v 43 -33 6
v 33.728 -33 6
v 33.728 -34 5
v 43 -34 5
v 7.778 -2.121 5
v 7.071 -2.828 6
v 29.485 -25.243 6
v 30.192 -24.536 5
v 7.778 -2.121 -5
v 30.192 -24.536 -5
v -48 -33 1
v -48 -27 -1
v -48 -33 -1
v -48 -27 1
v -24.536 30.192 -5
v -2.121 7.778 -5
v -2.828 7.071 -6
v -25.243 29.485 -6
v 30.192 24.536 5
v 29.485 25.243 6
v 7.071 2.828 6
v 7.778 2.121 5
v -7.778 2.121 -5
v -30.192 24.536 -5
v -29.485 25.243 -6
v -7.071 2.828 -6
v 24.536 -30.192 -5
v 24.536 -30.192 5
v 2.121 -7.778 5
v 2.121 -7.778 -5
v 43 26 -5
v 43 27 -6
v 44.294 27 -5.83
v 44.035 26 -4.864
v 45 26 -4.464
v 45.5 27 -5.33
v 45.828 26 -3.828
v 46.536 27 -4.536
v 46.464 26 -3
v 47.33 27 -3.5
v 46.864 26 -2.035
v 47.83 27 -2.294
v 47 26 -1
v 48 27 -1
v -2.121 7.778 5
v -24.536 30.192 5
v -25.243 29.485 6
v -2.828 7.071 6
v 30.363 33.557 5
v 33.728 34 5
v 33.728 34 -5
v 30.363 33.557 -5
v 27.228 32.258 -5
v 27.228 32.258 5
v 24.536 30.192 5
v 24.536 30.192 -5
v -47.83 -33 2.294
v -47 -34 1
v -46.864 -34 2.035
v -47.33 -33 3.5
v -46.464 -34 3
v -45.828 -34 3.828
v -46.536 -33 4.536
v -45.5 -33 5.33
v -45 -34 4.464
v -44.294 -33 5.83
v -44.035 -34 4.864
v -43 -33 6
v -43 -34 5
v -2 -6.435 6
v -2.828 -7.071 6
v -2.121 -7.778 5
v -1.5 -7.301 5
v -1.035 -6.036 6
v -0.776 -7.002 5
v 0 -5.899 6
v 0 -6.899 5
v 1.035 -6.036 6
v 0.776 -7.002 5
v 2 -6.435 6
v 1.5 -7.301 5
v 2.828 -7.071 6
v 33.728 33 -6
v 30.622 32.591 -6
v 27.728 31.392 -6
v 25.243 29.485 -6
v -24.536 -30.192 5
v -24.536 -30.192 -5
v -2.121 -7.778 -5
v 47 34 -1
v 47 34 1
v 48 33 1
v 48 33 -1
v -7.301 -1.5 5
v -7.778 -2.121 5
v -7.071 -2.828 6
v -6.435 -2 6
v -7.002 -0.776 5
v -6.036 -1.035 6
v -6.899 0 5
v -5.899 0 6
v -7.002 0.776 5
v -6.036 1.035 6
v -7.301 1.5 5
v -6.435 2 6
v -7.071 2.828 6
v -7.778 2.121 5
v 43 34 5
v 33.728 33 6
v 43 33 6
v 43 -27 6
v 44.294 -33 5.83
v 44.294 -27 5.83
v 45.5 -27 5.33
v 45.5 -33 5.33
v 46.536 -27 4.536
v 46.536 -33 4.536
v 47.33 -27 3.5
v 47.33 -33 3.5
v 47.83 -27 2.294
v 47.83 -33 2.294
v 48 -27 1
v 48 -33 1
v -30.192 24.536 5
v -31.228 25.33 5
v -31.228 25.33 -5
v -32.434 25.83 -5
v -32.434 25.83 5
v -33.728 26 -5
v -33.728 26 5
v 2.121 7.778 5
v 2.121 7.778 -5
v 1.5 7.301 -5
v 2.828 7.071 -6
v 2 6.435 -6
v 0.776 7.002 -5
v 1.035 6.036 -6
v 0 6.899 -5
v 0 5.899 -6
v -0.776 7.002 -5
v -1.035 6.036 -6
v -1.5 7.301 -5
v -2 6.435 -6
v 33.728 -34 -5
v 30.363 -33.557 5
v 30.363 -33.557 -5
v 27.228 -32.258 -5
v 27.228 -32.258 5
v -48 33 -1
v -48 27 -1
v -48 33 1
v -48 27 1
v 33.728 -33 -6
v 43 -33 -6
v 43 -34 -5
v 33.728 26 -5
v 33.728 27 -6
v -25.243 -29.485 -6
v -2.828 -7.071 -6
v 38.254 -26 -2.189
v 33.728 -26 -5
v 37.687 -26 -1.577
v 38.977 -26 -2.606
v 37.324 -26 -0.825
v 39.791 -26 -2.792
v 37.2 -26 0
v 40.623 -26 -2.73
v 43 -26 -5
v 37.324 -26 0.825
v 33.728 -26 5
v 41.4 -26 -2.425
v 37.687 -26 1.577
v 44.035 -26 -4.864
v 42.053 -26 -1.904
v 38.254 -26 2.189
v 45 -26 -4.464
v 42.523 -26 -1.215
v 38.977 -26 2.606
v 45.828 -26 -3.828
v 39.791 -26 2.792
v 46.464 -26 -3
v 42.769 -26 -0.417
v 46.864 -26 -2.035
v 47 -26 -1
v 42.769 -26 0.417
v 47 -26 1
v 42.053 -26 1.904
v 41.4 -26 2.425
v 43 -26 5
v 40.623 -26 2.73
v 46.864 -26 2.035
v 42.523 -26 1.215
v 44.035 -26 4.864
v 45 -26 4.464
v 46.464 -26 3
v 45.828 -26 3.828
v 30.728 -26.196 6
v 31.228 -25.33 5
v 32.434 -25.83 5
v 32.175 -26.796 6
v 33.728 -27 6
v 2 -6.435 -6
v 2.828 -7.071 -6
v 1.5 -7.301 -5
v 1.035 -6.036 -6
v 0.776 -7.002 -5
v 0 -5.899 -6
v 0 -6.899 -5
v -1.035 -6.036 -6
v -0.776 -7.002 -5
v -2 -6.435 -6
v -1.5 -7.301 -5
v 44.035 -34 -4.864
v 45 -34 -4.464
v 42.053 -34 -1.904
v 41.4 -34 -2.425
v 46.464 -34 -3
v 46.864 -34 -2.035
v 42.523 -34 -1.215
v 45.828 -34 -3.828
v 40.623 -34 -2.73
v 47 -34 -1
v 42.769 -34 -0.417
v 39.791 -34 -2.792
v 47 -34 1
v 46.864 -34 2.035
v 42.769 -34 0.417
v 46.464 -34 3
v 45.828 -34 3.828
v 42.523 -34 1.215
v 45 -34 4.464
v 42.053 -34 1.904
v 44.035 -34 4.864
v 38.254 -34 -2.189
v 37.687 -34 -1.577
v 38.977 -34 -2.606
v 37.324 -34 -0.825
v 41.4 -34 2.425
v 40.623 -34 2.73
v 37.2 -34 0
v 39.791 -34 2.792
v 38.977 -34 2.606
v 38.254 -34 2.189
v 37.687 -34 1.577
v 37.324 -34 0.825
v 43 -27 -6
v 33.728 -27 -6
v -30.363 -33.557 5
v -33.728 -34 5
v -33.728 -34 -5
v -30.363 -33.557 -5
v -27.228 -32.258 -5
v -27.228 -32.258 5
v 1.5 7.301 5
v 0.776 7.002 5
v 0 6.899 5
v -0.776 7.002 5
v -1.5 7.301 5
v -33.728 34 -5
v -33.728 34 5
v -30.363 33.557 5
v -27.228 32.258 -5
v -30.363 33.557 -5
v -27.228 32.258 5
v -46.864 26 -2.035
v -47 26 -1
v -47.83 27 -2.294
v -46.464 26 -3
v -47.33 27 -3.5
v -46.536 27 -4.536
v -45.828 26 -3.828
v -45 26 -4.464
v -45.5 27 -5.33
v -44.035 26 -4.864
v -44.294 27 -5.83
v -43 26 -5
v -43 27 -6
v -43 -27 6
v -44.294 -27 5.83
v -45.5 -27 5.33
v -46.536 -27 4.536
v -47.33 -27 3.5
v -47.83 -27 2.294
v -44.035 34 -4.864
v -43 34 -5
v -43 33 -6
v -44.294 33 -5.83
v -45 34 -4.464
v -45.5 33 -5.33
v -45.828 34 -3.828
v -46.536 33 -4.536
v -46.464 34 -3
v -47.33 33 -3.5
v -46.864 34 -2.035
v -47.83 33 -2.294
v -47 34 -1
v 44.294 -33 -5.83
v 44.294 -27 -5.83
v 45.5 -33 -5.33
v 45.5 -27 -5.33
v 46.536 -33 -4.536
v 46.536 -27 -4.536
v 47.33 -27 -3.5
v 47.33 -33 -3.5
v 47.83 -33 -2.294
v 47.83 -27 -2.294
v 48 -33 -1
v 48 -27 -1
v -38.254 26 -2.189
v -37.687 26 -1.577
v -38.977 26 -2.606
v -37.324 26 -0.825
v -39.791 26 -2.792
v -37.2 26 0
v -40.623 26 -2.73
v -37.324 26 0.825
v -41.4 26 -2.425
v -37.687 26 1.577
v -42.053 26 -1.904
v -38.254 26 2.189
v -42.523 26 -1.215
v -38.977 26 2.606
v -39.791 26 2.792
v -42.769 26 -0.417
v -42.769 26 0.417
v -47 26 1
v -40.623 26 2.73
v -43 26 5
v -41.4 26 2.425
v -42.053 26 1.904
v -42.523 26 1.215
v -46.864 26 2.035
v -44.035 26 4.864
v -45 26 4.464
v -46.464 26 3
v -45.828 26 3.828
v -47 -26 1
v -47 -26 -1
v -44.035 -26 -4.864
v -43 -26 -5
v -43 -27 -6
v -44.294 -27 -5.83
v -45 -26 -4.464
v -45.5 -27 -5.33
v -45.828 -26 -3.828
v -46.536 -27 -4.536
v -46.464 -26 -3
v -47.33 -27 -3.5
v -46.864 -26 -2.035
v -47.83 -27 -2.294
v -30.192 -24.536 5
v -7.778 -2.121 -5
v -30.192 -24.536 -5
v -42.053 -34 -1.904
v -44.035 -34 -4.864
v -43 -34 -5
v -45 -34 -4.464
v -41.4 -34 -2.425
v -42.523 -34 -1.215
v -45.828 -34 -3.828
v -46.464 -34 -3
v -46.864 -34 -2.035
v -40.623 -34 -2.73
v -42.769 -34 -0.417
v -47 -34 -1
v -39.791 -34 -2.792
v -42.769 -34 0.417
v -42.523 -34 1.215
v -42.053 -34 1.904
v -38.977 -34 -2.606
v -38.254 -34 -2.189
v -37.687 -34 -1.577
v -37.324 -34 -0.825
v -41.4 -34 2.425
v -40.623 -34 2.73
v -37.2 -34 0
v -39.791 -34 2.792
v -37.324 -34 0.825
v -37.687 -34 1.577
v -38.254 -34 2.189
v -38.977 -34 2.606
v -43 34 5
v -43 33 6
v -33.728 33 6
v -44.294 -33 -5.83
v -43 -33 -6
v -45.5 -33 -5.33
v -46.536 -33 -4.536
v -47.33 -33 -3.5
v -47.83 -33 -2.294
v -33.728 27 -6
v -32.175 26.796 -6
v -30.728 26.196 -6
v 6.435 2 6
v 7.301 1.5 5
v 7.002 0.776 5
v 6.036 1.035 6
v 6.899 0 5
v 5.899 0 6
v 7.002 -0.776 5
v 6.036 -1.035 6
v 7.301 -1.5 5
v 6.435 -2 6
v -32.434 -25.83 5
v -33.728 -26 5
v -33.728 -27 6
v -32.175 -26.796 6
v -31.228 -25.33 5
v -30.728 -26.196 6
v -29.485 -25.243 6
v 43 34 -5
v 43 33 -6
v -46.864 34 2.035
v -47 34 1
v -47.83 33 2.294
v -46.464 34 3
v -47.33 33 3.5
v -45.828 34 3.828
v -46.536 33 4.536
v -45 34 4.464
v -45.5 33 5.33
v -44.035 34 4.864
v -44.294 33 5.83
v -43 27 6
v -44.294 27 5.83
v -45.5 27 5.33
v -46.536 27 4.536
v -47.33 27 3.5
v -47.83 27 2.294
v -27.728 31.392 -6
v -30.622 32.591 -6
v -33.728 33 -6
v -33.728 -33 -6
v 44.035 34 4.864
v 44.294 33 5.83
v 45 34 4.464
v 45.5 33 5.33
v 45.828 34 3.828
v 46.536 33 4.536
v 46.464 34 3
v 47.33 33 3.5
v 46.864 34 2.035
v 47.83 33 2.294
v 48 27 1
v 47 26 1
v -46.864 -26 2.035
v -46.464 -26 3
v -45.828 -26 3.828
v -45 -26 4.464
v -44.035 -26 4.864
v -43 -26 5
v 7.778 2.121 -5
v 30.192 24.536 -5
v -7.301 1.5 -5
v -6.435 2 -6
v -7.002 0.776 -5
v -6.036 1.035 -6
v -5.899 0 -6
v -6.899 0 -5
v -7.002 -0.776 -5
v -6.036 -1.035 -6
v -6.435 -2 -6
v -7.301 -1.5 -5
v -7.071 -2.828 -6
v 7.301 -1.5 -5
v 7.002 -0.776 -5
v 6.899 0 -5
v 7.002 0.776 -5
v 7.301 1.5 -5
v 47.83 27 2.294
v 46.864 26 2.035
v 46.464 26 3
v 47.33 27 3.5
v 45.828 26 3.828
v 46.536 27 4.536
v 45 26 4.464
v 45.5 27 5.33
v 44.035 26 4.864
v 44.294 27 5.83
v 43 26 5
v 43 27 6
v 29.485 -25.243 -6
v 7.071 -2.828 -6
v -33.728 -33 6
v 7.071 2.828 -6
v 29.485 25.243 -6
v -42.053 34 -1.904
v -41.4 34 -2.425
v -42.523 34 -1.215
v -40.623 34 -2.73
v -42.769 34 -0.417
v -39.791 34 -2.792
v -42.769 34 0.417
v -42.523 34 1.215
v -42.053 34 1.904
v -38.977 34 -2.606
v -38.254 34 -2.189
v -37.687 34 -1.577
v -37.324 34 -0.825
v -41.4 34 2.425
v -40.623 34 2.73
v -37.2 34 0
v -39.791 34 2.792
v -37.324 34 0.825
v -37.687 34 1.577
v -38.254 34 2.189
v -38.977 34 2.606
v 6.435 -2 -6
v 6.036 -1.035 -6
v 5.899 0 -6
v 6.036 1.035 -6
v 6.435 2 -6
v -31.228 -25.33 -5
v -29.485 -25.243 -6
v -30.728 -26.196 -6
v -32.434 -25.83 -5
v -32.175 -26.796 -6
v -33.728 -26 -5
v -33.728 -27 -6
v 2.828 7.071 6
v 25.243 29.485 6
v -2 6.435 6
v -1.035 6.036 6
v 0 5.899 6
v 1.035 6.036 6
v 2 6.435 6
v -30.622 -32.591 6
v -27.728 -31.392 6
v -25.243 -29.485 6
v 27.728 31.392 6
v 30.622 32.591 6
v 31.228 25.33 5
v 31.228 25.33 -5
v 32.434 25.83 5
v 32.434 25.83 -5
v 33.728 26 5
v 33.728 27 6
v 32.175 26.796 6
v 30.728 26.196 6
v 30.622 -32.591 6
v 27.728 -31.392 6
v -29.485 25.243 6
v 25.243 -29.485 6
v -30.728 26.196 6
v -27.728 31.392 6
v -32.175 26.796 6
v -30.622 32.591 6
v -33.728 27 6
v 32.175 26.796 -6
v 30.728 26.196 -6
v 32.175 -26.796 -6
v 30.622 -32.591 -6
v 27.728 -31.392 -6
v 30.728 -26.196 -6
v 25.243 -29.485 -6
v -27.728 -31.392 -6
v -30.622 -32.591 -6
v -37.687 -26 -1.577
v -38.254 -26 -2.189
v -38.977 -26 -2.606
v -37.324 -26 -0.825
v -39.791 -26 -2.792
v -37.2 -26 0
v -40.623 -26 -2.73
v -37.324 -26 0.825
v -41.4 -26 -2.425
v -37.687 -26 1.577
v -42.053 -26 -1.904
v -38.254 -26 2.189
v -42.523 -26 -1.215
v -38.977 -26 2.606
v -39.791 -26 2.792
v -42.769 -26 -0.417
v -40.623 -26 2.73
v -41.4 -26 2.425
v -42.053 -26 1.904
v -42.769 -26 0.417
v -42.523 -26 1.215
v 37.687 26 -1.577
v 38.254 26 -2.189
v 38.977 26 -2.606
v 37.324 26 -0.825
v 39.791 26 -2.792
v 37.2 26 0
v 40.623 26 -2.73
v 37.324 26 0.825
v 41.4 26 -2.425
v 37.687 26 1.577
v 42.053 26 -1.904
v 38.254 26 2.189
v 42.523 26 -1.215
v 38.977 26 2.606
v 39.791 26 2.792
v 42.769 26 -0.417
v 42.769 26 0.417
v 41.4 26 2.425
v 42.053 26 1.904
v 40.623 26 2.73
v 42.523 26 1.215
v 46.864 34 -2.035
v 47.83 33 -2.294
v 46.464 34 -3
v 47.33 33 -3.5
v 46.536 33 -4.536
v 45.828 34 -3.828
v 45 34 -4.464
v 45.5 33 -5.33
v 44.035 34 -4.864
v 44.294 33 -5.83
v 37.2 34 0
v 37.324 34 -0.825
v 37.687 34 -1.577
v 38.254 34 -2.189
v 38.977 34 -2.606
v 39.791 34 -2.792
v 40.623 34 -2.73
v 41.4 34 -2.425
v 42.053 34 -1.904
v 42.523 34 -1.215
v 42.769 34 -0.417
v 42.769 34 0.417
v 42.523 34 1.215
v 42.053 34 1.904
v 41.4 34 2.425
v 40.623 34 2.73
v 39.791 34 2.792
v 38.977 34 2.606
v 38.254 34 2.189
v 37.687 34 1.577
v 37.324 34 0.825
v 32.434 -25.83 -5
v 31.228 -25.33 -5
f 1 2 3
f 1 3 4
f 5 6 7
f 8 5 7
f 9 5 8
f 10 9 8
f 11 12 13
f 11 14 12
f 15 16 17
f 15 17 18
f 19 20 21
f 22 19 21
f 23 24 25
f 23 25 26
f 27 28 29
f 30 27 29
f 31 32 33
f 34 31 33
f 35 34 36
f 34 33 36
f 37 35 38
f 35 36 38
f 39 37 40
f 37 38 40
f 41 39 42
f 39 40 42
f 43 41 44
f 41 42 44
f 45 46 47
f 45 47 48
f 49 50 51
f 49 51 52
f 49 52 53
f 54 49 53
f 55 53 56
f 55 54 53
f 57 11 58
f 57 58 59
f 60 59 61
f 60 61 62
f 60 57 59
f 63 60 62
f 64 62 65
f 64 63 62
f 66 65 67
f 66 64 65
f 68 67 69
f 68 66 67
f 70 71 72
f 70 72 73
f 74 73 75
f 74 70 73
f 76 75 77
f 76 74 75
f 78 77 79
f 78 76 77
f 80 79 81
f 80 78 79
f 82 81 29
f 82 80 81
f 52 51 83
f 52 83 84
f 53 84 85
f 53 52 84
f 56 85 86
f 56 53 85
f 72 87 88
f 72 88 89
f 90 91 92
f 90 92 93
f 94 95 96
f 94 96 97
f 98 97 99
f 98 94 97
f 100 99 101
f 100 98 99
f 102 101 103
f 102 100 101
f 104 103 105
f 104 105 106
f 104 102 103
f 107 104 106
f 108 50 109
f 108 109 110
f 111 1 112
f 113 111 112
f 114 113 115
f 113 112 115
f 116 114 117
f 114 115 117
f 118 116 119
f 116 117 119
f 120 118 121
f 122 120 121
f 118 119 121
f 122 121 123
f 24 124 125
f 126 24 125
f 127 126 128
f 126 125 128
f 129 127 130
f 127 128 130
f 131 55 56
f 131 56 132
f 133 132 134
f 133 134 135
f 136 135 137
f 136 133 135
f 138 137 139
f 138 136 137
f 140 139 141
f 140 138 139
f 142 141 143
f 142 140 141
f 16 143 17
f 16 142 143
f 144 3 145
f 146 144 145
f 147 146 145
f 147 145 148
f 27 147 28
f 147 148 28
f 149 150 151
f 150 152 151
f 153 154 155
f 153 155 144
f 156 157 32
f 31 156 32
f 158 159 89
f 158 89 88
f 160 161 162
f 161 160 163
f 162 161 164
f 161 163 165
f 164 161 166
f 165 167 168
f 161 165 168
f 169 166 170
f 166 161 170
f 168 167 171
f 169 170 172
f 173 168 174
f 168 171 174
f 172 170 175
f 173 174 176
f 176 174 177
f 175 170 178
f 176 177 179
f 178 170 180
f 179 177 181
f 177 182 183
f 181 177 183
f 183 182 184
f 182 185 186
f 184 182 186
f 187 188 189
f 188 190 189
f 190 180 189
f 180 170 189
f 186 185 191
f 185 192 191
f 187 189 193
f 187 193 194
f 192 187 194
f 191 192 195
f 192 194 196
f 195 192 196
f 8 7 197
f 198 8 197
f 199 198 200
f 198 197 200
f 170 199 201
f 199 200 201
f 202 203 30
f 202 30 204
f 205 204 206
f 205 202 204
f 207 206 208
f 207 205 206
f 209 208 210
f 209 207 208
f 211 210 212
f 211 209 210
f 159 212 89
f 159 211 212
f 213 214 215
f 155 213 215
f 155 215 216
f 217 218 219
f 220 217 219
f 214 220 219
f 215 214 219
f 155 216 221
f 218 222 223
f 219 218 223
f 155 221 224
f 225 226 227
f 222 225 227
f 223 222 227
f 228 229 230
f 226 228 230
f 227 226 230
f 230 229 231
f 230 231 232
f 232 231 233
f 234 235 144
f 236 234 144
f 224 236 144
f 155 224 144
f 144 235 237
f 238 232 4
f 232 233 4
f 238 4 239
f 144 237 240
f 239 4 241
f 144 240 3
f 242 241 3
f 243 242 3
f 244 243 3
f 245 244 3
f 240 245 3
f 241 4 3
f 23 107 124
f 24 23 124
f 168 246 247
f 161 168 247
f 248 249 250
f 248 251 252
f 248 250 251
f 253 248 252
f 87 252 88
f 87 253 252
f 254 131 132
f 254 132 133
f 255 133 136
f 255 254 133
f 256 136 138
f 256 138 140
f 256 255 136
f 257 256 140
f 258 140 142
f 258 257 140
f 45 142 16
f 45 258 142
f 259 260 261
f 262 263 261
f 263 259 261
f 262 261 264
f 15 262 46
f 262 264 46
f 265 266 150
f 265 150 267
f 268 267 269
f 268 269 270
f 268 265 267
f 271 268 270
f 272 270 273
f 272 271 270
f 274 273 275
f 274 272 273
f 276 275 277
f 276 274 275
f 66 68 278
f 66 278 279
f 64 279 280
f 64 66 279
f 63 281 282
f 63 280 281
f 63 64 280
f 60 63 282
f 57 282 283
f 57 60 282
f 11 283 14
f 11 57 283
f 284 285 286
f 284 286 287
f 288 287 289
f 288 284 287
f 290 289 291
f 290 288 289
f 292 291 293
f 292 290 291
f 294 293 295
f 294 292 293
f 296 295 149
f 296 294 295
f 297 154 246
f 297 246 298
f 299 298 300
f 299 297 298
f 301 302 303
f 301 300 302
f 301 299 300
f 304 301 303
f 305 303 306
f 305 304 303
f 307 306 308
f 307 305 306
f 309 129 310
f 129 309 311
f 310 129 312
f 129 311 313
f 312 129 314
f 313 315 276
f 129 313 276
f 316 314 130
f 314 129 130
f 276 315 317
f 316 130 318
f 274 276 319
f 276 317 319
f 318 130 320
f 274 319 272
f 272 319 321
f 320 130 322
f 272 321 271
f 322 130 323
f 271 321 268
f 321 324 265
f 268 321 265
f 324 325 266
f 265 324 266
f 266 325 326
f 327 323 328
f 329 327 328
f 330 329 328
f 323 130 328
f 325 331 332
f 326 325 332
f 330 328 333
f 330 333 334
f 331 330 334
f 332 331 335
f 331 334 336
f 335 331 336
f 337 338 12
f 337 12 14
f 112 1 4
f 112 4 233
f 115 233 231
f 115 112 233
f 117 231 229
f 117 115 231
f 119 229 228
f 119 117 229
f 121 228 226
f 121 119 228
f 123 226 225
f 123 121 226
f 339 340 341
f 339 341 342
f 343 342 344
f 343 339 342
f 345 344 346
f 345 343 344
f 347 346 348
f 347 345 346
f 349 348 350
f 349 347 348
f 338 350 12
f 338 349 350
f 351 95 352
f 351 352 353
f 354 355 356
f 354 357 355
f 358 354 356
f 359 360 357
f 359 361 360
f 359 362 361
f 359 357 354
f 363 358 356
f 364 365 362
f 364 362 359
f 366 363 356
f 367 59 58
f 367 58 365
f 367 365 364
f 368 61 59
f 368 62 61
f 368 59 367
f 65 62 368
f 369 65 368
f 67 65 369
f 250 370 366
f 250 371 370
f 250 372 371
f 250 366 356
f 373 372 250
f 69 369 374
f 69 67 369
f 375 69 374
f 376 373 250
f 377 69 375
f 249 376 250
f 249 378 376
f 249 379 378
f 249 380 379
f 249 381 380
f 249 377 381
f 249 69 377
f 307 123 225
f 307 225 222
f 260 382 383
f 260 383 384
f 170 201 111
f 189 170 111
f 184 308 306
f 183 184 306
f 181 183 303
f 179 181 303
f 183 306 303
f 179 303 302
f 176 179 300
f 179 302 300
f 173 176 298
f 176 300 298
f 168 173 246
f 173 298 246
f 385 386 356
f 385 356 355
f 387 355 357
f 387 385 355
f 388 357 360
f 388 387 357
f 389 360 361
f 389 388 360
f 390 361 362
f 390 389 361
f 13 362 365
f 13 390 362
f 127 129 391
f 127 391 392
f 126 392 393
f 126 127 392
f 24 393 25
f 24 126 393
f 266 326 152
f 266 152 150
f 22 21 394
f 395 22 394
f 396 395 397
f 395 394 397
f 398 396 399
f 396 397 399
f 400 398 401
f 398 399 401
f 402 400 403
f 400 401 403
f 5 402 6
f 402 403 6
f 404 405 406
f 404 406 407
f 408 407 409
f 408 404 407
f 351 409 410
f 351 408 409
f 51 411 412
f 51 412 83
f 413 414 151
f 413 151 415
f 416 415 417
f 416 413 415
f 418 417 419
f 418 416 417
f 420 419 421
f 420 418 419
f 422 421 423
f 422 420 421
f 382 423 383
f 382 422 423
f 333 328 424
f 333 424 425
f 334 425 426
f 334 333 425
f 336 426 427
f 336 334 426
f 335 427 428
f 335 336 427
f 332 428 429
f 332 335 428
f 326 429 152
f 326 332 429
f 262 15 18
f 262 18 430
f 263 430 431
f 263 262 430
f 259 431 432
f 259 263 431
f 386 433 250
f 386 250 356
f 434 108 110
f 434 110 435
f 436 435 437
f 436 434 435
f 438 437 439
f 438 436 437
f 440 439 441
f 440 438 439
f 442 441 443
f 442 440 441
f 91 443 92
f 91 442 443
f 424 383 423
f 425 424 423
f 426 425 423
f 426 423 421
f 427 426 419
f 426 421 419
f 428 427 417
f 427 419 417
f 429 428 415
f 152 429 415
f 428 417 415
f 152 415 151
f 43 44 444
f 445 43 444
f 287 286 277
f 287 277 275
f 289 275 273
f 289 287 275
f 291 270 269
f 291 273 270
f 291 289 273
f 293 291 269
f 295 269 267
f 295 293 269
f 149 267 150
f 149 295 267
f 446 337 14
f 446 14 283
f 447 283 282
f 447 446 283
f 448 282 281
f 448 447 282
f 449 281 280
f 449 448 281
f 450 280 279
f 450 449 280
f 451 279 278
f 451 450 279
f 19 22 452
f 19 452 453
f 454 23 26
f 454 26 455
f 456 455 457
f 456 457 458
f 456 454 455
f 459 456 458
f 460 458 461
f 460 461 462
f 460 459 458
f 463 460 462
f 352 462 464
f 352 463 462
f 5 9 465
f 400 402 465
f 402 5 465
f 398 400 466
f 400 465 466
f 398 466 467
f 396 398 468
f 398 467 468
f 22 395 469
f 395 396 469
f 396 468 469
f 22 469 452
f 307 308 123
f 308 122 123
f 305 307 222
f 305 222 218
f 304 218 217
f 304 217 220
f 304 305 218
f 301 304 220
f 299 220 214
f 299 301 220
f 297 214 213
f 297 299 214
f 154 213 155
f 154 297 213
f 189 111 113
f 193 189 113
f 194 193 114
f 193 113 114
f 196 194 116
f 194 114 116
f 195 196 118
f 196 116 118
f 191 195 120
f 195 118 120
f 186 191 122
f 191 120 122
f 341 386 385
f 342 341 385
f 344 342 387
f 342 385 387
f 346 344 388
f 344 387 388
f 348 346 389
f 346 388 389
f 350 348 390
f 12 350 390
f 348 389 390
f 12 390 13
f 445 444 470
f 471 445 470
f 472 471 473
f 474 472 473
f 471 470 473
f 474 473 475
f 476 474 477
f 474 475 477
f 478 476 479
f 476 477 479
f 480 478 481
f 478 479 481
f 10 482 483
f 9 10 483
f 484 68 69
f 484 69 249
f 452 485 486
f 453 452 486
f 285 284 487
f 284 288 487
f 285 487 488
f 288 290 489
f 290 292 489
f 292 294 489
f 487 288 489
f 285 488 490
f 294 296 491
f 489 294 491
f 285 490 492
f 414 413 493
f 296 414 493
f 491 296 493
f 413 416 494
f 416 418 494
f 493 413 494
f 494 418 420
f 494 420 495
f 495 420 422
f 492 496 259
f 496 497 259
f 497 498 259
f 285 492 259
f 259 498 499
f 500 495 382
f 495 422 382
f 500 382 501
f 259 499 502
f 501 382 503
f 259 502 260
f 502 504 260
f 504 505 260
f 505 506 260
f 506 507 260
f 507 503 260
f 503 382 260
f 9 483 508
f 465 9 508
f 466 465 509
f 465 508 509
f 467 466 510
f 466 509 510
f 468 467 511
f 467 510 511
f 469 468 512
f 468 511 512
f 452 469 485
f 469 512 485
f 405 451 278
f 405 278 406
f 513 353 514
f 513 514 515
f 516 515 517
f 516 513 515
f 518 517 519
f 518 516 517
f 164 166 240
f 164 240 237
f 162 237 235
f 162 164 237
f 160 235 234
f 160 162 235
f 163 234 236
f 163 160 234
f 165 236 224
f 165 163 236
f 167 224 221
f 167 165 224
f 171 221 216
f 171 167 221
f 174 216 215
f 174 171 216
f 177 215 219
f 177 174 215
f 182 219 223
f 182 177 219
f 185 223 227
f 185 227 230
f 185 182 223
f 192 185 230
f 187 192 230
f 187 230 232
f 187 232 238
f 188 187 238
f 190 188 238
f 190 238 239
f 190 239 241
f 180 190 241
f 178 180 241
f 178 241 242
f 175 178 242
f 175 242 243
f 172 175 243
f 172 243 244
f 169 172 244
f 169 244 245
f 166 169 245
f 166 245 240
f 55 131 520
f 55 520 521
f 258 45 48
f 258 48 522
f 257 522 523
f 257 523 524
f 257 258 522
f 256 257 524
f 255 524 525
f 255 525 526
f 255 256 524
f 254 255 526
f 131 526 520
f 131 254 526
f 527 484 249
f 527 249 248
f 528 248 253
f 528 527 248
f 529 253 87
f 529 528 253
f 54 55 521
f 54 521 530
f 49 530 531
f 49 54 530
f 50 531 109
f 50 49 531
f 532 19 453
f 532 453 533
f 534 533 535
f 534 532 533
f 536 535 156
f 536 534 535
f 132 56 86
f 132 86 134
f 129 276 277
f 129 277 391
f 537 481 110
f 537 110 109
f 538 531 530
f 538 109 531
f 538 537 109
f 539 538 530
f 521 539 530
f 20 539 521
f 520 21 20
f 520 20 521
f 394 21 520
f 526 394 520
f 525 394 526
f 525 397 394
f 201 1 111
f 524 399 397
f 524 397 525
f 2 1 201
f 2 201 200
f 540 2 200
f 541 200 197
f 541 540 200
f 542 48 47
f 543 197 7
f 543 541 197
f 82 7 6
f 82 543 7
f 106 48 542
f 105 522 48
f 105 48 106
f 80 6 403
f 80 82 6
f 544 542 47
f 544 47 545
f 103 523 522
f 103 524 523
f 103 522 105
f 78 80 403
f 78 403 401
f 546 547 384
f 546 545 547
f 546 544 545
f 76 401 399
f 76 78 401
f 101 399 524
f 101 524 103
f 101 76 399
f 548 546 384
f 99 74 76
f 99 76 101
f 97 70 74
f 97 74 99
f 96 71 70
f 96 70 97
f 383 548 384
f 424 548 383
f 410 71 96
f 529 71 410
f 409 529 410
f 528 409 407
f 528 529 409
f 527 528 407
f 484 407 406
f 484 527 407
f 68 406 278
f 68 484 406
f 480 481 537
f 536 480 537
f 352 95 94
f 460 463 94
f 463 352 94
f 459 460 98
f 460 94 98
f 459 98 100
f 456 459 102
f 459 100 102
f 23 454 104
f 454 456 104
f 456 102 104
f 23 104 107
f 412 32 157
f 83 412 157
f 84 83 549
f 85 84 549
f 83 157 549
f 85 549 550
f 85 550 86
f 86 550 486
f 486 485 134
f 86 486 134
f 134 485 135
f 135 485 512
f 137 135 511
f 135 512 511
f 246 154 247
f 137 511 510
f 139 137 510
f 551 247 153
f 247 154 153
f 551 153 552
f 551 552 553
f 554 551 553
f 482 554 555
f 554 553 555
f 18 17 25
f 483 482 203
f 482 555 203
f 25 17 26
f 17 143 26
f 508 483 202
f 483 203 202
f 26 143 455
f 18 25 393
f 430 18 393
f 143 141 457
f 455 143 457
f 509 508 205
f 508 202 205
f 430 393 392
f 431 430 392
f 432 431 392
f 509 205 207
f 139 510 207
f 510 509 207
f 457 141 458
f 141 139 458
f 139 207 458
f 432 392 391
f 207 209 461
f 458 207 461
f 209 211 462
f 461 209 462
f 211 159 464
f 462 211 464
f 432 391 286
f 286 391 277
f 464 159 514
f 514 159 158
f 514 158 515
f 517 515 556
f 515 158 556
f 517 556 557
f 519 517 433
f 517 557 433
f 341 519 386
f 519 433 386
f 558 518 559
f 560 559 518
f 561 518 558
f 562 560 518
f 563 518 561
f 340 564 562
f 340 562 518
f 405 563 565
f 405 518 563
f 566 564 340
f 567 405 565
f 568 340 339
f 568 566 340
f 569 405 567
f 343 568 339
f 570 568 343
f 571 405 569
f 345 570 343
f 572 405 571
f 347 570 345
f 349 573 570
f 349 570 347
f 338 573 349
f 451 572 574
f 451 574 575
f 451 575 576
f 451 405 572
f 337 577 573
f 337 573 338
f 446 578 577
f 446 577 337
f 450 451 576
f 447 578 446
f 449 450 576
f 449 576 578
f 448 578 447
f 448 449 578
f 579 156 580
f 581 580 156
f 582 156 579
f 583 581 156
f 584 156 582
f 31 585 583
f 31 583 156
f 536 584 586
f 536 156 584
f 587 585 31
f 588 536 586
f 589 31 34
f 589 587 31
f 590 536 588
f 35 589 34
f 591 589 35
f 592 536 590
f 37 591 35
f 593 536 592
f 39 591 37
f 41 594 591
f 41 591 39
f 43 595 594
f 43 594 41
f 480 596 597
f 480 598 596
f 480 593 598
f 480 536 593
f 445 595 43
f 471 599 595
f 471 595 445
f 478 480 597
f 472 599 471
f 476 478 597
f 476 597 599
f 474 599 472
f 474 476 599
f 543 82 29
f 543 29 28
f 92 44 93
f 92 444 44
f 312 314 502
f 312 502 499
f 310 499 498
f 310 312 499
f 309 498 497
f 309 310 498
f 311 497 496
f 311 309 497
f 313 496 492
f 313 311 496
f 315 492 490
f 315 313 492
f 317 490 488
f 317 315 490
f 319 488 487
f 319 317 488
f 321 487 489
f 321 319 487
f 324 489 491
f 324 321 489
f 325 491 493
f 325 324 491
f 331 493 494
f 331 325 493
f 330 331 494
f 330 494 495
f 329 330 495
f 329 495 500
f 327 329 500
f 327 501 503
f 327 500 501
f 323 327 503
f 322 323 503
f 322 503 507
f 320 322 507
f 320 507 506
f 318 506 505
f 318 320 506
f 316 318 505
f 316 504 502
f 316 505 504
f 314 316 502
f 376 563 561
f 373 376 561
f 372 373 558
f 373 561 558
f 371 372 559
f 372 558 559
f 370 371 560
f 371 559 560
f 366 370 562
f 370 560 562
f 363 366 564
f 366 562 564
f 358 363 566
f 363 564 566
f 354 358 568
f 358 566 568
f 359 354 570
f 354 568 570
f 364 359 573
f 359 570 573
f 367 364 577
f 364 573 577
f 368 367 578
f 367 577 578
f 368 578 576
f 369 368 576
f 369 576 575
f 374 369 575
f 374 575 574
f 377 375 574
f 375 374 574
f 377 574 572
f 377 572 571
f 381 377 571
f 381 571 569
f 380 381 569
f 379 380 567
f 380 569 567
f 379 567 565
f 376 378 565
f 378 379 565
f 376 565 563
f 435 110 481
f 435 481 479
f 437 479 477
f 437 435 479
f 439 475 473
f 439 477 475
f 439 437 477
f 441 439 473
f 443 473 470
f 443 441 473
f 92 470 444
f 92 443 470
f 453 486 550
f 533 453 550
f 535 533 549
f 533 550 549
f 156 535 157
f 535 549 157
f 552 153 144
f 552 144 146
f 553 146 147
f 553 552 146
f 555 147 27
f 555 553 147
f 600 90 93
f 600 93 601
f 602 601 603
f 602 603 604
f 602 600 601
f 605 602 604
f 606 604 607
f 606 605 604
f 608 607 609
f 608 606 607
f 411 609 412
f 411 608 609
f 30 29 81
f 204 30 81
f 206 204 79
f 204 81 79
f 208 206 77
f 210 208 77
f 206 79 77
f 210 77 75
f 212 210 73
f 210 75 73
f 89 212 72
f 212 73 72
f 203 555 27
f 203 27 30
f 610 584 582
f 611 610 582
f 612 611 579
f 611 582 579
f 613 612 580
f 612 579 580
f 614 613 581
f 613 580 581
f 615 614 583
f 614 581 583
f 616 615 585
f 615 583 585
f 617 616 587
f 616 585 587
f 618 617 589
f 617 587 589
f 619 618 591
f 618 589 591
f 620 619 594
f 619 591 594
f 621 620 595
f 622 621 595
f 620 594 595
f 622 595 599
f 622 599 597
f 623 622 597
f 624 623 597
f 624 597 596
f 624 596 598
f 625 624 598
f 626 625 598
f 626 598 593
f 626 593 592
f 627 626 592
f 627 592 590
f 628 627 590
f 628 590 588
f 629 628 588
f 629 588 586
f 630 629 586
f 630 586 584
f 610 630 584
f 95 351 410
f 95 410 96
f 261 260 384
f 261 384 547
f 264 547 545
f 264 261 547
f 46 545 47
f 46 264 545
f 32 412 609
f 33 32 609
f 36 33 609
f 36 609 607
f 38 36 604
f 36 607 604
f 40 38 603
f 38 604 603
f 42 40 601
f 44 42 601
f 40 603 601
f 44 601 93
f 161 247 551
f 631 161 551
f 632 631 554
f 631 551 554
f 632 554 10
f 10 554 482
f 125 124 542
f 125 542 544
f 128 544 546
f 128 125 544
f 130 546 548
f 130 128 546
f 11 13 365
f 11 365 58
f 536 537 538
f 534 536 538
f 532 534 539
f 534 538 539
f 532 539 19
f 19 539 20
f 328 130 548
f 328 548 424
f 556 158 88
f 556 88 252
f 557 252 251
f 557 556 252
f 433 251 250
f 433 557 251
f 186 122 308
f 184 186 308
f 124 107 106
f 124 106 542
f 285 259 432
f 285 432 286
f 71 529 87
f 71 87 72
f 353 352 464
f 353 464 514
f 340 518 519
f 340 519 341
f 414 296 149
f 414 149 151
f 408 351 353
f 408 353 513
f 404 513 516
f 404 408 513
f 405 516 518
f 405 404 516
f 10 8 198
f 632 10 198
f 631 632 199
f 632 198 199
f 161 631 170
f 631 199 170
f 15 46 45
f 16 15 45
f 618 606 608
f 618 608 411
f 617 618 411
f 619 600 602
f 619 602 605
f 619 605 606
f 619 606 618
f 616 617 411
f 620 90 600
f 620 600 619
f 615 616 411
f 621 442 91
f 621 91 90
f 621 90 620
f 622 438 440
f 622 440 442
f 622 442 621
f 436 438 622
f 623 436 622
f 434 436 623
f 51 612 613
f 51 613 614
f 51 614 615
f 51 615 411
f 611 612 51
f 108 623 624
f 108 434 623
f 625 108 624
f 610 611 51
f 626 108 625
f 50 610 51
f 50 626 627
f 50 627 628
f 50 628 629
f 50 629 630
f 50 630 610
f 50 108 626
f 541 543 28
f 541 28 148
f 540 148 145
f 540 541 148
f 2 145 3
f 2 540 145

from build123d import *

# Parameters (mm, degrees)
EXTRUIR_L_MINA1_DEPTH    = 6
TALADRO1_D               = 5.6
TALADRO1_DEPTH           = 68
REDONDEO1_R              = 5
REDONDEO1_OF_SIMETR_A1_R = 5
REDONDEO3_R              = 3
CHAFL_N4_SIZE            = 1


# Read off the part's stored shape, not the designer's step: Simetría2
with BuildPart() as part:
    # Croquis1 → Extruir-Lámina1 (new, symmetric)
    with BuildSketch(Plane.XY):
        with BuildLine():
            Line((2.828427125, -2.828427125), (30.192388155, 24.535533906))
            ThreePointArc((30.192388155, 24.535533906), (31.8145049, 25.619397663), (33.727922061, 26))
            Line((33.727922061, 26), (48, 26))
            Line((48, 26), (48, 34))
            Line((48, 34), (33.727922061, 34))
            ThreePointArc((33.727922061, 34), (28.753037441, 33.010433923), (24.535533906, 30.192388155))
            Line((24.535533906, 30.192388155), (-2.828427125, 2.828427125))
            Line((-2.828427125, 2.828427125), (2.828427125, -2.828427125))
        make_face()
    extruir_l_mina1 = extrude(amount=EXTRUIR_L_MINA1_DEPTH, both=True)

    # Taladro1
    with Locations(Plane(origin=(0, 34, 0), x_dir=(1, 0, 0), z_dir=(0, 1, 0))):
        with Locations((40, 0)):
            taladro1 = Hole(TALADRO1_D / 2, depth=TALADRO1_DEPTH)

    # Redondeo1
    redondeo1_edges = [part.edges().sort_by_distance(p)[0] for p in [
        (48, 30, 6),
        (48, 30, -6),
    ]]
    fillet(redondeo1_edges, radius=REDONDEO1_R)

    # Simetría1: Extruir-Lámina1, Taladro1 across plane
    add(extruir_l_mina1.mirror(Plane(origin=(0, 0, 0), x_dir=(0, 0, 1), z_dir=(1, 0, 0))))
    add(taladro1.mirror(Plane(origin=(0, 0, 0), x_dir=(0, 0, 1), z_dir=(1, 0, 0))), mode=Mode.SUBTRACT)

    # Redondeo1 of Simetría1
    redondeo1_of_simetr_a1_edges = [part.edges().sort_by_distance(p)[0] for p in [
        (-48, 30, 6),
        (-48, 30, -6),
    ]]
    fillet(redondeo1_of_simetr_a1_edges, radius=REDONDEO1_OF_SIMETR_A1_R)

    # Simetría2: part across plane


with BuildPart() as part_1:
    add(part.part)
    add(part.part.mirror(Plane.ZX))

    # Redondeo3
    redondeo3_edges = [part_1.edges().sort_by_distance(p)[0] for p in [
        (-5.656854249, 0, 0),
        (5.656854249, 0, 0),
        (0, -5.656854249, 0),
        (0, 5.656854249, 0),
    ]]
    fillet(redondeo3_edges, radius=REDONDEO3_R)

    # Chaflán4
    chafl_n4_edges = [part_1.edges().sort_by_distance(p)[0] for p in [
        (38.363961031, 34, -6),
        (-38.363961031, -26, -6),
        (-31.8145049, -25.619397663, -6),
        (-28.753037441, -33.010433923, 6),
        (-38.363961031, -34, 6),
        (-28.753037441, -33.010433923, -6),
        (-38.363961031, -34, -6),
        (-31.8145049, -25.619397663, 6),
        (-38.363961031, -26, 6),
        (28.753037441, 33.010433923, -6),
        (-48, -26, 0),
        (-46.535533906, -26, 4.535533906),
        (-46.535533906, -26, -4.535533906),
        (-48, -34, 0),
        (-46.535533906, -34, 4.535533906),
        (-46.535533906, -34, -4.535533906),
        (38.363961031, -26, 6),
        (38.363961031, -34, -6),
        (28.753037441, -33.010433923, -6),
        (31.8145049, -25.619397663, 6),
        (31.8145049, -25.619397663, -6),
        (38.363961031, -26, -6),
        (28.753037441, -33.010433923, 6),
        (38.363961031, -34, 6),
        (48, -26, 0),
        (48, -34, 0),
        (38.363961031, 34, 6),
        (46.535533906, -26, 4.535533906),
        (46.535533906, -26, -4.535533906),
        (28.753037441, 33.010433923, 6),
        (46.535533906, -34, 4.535533906),
        (46.535533906, -34, -4.535533906),
        (13.328427125, -18.985281374, 6),
        (13.328427125, -18.985281374, -6),
        (18.985281374, 13.328427125, 6),
        (18.985281374, 13.328427125, -6),
        (18.985281374, -13.328427125, 6),
        (18.985281374, -13.328427125, -6),
        (-18.985281374, 13.328427125, -6),
        (-18.985281374, 13.328427125, 6),
        (-18.985281374, -13.328427125, -6),
        (38.363961031, 26, 6),
        (-18.985281374, -13.328427125, 6),
        (13.328427125, 18.985281374, -6),
        (13.328427125, 18.985281374, 6),
        (-13.328427125, 18.985281374, -6),
        (-13.328427125, -18.985281374, 6),
        (-13.328427125, 18.985281374, 6),
        (0, -6.899494937, -6),
        (0, -6.899494937, 6),
        (31.8145049, 25.619397663, 6),
        (6.899494937, 0, -6),
        (6.899494937, 0, 6),
        (-6.899494937, 0, 6),
        (-6.899494937, 0, -6),
        (0, 6.899494937, 6),
        (0, 6.899494937, -6),
        (-13.328427125, -18.985281374, -6),
        (31.8145049, 25.619397663, -6),
        (38.363961031, 26, -6),
        (48, 26, 0),
        (46.535533906, 26, 4.535533906),
        (46.535533906, 26, -4.535533906),
        (48, 34, 0),
        (46.535533906, 34, 4.535533906),
        (46.535533906, 34, -4.535533906),
        (-31.8145049, 25.619397663, -6),
        (-38.363961031, 26, -6),
        (-28.753037441, 33.010433923, 6),
        (-38.363961031, 34, 6),
        (-38.363961031, 26, 6),
        (-38.363961031, 34, -6),
        (-28.753037441, 33.010433923, -6),
        (-31.8145049, 25.619397663, 6),
        (-48, 26, 0),
        (-48, 34, 0),
        (-46.535533906, 26, 4.535533906),
        (-46.535533906, 26, -4.535533906),
        (-46.535533906, 34, 4.535533906),
        (-46.535533906, 34, -4.535533906),
    ]]
    chamfer(chafl_n4_edges, length=CHAFL_N4_SIZE)


solid = part_1.part
